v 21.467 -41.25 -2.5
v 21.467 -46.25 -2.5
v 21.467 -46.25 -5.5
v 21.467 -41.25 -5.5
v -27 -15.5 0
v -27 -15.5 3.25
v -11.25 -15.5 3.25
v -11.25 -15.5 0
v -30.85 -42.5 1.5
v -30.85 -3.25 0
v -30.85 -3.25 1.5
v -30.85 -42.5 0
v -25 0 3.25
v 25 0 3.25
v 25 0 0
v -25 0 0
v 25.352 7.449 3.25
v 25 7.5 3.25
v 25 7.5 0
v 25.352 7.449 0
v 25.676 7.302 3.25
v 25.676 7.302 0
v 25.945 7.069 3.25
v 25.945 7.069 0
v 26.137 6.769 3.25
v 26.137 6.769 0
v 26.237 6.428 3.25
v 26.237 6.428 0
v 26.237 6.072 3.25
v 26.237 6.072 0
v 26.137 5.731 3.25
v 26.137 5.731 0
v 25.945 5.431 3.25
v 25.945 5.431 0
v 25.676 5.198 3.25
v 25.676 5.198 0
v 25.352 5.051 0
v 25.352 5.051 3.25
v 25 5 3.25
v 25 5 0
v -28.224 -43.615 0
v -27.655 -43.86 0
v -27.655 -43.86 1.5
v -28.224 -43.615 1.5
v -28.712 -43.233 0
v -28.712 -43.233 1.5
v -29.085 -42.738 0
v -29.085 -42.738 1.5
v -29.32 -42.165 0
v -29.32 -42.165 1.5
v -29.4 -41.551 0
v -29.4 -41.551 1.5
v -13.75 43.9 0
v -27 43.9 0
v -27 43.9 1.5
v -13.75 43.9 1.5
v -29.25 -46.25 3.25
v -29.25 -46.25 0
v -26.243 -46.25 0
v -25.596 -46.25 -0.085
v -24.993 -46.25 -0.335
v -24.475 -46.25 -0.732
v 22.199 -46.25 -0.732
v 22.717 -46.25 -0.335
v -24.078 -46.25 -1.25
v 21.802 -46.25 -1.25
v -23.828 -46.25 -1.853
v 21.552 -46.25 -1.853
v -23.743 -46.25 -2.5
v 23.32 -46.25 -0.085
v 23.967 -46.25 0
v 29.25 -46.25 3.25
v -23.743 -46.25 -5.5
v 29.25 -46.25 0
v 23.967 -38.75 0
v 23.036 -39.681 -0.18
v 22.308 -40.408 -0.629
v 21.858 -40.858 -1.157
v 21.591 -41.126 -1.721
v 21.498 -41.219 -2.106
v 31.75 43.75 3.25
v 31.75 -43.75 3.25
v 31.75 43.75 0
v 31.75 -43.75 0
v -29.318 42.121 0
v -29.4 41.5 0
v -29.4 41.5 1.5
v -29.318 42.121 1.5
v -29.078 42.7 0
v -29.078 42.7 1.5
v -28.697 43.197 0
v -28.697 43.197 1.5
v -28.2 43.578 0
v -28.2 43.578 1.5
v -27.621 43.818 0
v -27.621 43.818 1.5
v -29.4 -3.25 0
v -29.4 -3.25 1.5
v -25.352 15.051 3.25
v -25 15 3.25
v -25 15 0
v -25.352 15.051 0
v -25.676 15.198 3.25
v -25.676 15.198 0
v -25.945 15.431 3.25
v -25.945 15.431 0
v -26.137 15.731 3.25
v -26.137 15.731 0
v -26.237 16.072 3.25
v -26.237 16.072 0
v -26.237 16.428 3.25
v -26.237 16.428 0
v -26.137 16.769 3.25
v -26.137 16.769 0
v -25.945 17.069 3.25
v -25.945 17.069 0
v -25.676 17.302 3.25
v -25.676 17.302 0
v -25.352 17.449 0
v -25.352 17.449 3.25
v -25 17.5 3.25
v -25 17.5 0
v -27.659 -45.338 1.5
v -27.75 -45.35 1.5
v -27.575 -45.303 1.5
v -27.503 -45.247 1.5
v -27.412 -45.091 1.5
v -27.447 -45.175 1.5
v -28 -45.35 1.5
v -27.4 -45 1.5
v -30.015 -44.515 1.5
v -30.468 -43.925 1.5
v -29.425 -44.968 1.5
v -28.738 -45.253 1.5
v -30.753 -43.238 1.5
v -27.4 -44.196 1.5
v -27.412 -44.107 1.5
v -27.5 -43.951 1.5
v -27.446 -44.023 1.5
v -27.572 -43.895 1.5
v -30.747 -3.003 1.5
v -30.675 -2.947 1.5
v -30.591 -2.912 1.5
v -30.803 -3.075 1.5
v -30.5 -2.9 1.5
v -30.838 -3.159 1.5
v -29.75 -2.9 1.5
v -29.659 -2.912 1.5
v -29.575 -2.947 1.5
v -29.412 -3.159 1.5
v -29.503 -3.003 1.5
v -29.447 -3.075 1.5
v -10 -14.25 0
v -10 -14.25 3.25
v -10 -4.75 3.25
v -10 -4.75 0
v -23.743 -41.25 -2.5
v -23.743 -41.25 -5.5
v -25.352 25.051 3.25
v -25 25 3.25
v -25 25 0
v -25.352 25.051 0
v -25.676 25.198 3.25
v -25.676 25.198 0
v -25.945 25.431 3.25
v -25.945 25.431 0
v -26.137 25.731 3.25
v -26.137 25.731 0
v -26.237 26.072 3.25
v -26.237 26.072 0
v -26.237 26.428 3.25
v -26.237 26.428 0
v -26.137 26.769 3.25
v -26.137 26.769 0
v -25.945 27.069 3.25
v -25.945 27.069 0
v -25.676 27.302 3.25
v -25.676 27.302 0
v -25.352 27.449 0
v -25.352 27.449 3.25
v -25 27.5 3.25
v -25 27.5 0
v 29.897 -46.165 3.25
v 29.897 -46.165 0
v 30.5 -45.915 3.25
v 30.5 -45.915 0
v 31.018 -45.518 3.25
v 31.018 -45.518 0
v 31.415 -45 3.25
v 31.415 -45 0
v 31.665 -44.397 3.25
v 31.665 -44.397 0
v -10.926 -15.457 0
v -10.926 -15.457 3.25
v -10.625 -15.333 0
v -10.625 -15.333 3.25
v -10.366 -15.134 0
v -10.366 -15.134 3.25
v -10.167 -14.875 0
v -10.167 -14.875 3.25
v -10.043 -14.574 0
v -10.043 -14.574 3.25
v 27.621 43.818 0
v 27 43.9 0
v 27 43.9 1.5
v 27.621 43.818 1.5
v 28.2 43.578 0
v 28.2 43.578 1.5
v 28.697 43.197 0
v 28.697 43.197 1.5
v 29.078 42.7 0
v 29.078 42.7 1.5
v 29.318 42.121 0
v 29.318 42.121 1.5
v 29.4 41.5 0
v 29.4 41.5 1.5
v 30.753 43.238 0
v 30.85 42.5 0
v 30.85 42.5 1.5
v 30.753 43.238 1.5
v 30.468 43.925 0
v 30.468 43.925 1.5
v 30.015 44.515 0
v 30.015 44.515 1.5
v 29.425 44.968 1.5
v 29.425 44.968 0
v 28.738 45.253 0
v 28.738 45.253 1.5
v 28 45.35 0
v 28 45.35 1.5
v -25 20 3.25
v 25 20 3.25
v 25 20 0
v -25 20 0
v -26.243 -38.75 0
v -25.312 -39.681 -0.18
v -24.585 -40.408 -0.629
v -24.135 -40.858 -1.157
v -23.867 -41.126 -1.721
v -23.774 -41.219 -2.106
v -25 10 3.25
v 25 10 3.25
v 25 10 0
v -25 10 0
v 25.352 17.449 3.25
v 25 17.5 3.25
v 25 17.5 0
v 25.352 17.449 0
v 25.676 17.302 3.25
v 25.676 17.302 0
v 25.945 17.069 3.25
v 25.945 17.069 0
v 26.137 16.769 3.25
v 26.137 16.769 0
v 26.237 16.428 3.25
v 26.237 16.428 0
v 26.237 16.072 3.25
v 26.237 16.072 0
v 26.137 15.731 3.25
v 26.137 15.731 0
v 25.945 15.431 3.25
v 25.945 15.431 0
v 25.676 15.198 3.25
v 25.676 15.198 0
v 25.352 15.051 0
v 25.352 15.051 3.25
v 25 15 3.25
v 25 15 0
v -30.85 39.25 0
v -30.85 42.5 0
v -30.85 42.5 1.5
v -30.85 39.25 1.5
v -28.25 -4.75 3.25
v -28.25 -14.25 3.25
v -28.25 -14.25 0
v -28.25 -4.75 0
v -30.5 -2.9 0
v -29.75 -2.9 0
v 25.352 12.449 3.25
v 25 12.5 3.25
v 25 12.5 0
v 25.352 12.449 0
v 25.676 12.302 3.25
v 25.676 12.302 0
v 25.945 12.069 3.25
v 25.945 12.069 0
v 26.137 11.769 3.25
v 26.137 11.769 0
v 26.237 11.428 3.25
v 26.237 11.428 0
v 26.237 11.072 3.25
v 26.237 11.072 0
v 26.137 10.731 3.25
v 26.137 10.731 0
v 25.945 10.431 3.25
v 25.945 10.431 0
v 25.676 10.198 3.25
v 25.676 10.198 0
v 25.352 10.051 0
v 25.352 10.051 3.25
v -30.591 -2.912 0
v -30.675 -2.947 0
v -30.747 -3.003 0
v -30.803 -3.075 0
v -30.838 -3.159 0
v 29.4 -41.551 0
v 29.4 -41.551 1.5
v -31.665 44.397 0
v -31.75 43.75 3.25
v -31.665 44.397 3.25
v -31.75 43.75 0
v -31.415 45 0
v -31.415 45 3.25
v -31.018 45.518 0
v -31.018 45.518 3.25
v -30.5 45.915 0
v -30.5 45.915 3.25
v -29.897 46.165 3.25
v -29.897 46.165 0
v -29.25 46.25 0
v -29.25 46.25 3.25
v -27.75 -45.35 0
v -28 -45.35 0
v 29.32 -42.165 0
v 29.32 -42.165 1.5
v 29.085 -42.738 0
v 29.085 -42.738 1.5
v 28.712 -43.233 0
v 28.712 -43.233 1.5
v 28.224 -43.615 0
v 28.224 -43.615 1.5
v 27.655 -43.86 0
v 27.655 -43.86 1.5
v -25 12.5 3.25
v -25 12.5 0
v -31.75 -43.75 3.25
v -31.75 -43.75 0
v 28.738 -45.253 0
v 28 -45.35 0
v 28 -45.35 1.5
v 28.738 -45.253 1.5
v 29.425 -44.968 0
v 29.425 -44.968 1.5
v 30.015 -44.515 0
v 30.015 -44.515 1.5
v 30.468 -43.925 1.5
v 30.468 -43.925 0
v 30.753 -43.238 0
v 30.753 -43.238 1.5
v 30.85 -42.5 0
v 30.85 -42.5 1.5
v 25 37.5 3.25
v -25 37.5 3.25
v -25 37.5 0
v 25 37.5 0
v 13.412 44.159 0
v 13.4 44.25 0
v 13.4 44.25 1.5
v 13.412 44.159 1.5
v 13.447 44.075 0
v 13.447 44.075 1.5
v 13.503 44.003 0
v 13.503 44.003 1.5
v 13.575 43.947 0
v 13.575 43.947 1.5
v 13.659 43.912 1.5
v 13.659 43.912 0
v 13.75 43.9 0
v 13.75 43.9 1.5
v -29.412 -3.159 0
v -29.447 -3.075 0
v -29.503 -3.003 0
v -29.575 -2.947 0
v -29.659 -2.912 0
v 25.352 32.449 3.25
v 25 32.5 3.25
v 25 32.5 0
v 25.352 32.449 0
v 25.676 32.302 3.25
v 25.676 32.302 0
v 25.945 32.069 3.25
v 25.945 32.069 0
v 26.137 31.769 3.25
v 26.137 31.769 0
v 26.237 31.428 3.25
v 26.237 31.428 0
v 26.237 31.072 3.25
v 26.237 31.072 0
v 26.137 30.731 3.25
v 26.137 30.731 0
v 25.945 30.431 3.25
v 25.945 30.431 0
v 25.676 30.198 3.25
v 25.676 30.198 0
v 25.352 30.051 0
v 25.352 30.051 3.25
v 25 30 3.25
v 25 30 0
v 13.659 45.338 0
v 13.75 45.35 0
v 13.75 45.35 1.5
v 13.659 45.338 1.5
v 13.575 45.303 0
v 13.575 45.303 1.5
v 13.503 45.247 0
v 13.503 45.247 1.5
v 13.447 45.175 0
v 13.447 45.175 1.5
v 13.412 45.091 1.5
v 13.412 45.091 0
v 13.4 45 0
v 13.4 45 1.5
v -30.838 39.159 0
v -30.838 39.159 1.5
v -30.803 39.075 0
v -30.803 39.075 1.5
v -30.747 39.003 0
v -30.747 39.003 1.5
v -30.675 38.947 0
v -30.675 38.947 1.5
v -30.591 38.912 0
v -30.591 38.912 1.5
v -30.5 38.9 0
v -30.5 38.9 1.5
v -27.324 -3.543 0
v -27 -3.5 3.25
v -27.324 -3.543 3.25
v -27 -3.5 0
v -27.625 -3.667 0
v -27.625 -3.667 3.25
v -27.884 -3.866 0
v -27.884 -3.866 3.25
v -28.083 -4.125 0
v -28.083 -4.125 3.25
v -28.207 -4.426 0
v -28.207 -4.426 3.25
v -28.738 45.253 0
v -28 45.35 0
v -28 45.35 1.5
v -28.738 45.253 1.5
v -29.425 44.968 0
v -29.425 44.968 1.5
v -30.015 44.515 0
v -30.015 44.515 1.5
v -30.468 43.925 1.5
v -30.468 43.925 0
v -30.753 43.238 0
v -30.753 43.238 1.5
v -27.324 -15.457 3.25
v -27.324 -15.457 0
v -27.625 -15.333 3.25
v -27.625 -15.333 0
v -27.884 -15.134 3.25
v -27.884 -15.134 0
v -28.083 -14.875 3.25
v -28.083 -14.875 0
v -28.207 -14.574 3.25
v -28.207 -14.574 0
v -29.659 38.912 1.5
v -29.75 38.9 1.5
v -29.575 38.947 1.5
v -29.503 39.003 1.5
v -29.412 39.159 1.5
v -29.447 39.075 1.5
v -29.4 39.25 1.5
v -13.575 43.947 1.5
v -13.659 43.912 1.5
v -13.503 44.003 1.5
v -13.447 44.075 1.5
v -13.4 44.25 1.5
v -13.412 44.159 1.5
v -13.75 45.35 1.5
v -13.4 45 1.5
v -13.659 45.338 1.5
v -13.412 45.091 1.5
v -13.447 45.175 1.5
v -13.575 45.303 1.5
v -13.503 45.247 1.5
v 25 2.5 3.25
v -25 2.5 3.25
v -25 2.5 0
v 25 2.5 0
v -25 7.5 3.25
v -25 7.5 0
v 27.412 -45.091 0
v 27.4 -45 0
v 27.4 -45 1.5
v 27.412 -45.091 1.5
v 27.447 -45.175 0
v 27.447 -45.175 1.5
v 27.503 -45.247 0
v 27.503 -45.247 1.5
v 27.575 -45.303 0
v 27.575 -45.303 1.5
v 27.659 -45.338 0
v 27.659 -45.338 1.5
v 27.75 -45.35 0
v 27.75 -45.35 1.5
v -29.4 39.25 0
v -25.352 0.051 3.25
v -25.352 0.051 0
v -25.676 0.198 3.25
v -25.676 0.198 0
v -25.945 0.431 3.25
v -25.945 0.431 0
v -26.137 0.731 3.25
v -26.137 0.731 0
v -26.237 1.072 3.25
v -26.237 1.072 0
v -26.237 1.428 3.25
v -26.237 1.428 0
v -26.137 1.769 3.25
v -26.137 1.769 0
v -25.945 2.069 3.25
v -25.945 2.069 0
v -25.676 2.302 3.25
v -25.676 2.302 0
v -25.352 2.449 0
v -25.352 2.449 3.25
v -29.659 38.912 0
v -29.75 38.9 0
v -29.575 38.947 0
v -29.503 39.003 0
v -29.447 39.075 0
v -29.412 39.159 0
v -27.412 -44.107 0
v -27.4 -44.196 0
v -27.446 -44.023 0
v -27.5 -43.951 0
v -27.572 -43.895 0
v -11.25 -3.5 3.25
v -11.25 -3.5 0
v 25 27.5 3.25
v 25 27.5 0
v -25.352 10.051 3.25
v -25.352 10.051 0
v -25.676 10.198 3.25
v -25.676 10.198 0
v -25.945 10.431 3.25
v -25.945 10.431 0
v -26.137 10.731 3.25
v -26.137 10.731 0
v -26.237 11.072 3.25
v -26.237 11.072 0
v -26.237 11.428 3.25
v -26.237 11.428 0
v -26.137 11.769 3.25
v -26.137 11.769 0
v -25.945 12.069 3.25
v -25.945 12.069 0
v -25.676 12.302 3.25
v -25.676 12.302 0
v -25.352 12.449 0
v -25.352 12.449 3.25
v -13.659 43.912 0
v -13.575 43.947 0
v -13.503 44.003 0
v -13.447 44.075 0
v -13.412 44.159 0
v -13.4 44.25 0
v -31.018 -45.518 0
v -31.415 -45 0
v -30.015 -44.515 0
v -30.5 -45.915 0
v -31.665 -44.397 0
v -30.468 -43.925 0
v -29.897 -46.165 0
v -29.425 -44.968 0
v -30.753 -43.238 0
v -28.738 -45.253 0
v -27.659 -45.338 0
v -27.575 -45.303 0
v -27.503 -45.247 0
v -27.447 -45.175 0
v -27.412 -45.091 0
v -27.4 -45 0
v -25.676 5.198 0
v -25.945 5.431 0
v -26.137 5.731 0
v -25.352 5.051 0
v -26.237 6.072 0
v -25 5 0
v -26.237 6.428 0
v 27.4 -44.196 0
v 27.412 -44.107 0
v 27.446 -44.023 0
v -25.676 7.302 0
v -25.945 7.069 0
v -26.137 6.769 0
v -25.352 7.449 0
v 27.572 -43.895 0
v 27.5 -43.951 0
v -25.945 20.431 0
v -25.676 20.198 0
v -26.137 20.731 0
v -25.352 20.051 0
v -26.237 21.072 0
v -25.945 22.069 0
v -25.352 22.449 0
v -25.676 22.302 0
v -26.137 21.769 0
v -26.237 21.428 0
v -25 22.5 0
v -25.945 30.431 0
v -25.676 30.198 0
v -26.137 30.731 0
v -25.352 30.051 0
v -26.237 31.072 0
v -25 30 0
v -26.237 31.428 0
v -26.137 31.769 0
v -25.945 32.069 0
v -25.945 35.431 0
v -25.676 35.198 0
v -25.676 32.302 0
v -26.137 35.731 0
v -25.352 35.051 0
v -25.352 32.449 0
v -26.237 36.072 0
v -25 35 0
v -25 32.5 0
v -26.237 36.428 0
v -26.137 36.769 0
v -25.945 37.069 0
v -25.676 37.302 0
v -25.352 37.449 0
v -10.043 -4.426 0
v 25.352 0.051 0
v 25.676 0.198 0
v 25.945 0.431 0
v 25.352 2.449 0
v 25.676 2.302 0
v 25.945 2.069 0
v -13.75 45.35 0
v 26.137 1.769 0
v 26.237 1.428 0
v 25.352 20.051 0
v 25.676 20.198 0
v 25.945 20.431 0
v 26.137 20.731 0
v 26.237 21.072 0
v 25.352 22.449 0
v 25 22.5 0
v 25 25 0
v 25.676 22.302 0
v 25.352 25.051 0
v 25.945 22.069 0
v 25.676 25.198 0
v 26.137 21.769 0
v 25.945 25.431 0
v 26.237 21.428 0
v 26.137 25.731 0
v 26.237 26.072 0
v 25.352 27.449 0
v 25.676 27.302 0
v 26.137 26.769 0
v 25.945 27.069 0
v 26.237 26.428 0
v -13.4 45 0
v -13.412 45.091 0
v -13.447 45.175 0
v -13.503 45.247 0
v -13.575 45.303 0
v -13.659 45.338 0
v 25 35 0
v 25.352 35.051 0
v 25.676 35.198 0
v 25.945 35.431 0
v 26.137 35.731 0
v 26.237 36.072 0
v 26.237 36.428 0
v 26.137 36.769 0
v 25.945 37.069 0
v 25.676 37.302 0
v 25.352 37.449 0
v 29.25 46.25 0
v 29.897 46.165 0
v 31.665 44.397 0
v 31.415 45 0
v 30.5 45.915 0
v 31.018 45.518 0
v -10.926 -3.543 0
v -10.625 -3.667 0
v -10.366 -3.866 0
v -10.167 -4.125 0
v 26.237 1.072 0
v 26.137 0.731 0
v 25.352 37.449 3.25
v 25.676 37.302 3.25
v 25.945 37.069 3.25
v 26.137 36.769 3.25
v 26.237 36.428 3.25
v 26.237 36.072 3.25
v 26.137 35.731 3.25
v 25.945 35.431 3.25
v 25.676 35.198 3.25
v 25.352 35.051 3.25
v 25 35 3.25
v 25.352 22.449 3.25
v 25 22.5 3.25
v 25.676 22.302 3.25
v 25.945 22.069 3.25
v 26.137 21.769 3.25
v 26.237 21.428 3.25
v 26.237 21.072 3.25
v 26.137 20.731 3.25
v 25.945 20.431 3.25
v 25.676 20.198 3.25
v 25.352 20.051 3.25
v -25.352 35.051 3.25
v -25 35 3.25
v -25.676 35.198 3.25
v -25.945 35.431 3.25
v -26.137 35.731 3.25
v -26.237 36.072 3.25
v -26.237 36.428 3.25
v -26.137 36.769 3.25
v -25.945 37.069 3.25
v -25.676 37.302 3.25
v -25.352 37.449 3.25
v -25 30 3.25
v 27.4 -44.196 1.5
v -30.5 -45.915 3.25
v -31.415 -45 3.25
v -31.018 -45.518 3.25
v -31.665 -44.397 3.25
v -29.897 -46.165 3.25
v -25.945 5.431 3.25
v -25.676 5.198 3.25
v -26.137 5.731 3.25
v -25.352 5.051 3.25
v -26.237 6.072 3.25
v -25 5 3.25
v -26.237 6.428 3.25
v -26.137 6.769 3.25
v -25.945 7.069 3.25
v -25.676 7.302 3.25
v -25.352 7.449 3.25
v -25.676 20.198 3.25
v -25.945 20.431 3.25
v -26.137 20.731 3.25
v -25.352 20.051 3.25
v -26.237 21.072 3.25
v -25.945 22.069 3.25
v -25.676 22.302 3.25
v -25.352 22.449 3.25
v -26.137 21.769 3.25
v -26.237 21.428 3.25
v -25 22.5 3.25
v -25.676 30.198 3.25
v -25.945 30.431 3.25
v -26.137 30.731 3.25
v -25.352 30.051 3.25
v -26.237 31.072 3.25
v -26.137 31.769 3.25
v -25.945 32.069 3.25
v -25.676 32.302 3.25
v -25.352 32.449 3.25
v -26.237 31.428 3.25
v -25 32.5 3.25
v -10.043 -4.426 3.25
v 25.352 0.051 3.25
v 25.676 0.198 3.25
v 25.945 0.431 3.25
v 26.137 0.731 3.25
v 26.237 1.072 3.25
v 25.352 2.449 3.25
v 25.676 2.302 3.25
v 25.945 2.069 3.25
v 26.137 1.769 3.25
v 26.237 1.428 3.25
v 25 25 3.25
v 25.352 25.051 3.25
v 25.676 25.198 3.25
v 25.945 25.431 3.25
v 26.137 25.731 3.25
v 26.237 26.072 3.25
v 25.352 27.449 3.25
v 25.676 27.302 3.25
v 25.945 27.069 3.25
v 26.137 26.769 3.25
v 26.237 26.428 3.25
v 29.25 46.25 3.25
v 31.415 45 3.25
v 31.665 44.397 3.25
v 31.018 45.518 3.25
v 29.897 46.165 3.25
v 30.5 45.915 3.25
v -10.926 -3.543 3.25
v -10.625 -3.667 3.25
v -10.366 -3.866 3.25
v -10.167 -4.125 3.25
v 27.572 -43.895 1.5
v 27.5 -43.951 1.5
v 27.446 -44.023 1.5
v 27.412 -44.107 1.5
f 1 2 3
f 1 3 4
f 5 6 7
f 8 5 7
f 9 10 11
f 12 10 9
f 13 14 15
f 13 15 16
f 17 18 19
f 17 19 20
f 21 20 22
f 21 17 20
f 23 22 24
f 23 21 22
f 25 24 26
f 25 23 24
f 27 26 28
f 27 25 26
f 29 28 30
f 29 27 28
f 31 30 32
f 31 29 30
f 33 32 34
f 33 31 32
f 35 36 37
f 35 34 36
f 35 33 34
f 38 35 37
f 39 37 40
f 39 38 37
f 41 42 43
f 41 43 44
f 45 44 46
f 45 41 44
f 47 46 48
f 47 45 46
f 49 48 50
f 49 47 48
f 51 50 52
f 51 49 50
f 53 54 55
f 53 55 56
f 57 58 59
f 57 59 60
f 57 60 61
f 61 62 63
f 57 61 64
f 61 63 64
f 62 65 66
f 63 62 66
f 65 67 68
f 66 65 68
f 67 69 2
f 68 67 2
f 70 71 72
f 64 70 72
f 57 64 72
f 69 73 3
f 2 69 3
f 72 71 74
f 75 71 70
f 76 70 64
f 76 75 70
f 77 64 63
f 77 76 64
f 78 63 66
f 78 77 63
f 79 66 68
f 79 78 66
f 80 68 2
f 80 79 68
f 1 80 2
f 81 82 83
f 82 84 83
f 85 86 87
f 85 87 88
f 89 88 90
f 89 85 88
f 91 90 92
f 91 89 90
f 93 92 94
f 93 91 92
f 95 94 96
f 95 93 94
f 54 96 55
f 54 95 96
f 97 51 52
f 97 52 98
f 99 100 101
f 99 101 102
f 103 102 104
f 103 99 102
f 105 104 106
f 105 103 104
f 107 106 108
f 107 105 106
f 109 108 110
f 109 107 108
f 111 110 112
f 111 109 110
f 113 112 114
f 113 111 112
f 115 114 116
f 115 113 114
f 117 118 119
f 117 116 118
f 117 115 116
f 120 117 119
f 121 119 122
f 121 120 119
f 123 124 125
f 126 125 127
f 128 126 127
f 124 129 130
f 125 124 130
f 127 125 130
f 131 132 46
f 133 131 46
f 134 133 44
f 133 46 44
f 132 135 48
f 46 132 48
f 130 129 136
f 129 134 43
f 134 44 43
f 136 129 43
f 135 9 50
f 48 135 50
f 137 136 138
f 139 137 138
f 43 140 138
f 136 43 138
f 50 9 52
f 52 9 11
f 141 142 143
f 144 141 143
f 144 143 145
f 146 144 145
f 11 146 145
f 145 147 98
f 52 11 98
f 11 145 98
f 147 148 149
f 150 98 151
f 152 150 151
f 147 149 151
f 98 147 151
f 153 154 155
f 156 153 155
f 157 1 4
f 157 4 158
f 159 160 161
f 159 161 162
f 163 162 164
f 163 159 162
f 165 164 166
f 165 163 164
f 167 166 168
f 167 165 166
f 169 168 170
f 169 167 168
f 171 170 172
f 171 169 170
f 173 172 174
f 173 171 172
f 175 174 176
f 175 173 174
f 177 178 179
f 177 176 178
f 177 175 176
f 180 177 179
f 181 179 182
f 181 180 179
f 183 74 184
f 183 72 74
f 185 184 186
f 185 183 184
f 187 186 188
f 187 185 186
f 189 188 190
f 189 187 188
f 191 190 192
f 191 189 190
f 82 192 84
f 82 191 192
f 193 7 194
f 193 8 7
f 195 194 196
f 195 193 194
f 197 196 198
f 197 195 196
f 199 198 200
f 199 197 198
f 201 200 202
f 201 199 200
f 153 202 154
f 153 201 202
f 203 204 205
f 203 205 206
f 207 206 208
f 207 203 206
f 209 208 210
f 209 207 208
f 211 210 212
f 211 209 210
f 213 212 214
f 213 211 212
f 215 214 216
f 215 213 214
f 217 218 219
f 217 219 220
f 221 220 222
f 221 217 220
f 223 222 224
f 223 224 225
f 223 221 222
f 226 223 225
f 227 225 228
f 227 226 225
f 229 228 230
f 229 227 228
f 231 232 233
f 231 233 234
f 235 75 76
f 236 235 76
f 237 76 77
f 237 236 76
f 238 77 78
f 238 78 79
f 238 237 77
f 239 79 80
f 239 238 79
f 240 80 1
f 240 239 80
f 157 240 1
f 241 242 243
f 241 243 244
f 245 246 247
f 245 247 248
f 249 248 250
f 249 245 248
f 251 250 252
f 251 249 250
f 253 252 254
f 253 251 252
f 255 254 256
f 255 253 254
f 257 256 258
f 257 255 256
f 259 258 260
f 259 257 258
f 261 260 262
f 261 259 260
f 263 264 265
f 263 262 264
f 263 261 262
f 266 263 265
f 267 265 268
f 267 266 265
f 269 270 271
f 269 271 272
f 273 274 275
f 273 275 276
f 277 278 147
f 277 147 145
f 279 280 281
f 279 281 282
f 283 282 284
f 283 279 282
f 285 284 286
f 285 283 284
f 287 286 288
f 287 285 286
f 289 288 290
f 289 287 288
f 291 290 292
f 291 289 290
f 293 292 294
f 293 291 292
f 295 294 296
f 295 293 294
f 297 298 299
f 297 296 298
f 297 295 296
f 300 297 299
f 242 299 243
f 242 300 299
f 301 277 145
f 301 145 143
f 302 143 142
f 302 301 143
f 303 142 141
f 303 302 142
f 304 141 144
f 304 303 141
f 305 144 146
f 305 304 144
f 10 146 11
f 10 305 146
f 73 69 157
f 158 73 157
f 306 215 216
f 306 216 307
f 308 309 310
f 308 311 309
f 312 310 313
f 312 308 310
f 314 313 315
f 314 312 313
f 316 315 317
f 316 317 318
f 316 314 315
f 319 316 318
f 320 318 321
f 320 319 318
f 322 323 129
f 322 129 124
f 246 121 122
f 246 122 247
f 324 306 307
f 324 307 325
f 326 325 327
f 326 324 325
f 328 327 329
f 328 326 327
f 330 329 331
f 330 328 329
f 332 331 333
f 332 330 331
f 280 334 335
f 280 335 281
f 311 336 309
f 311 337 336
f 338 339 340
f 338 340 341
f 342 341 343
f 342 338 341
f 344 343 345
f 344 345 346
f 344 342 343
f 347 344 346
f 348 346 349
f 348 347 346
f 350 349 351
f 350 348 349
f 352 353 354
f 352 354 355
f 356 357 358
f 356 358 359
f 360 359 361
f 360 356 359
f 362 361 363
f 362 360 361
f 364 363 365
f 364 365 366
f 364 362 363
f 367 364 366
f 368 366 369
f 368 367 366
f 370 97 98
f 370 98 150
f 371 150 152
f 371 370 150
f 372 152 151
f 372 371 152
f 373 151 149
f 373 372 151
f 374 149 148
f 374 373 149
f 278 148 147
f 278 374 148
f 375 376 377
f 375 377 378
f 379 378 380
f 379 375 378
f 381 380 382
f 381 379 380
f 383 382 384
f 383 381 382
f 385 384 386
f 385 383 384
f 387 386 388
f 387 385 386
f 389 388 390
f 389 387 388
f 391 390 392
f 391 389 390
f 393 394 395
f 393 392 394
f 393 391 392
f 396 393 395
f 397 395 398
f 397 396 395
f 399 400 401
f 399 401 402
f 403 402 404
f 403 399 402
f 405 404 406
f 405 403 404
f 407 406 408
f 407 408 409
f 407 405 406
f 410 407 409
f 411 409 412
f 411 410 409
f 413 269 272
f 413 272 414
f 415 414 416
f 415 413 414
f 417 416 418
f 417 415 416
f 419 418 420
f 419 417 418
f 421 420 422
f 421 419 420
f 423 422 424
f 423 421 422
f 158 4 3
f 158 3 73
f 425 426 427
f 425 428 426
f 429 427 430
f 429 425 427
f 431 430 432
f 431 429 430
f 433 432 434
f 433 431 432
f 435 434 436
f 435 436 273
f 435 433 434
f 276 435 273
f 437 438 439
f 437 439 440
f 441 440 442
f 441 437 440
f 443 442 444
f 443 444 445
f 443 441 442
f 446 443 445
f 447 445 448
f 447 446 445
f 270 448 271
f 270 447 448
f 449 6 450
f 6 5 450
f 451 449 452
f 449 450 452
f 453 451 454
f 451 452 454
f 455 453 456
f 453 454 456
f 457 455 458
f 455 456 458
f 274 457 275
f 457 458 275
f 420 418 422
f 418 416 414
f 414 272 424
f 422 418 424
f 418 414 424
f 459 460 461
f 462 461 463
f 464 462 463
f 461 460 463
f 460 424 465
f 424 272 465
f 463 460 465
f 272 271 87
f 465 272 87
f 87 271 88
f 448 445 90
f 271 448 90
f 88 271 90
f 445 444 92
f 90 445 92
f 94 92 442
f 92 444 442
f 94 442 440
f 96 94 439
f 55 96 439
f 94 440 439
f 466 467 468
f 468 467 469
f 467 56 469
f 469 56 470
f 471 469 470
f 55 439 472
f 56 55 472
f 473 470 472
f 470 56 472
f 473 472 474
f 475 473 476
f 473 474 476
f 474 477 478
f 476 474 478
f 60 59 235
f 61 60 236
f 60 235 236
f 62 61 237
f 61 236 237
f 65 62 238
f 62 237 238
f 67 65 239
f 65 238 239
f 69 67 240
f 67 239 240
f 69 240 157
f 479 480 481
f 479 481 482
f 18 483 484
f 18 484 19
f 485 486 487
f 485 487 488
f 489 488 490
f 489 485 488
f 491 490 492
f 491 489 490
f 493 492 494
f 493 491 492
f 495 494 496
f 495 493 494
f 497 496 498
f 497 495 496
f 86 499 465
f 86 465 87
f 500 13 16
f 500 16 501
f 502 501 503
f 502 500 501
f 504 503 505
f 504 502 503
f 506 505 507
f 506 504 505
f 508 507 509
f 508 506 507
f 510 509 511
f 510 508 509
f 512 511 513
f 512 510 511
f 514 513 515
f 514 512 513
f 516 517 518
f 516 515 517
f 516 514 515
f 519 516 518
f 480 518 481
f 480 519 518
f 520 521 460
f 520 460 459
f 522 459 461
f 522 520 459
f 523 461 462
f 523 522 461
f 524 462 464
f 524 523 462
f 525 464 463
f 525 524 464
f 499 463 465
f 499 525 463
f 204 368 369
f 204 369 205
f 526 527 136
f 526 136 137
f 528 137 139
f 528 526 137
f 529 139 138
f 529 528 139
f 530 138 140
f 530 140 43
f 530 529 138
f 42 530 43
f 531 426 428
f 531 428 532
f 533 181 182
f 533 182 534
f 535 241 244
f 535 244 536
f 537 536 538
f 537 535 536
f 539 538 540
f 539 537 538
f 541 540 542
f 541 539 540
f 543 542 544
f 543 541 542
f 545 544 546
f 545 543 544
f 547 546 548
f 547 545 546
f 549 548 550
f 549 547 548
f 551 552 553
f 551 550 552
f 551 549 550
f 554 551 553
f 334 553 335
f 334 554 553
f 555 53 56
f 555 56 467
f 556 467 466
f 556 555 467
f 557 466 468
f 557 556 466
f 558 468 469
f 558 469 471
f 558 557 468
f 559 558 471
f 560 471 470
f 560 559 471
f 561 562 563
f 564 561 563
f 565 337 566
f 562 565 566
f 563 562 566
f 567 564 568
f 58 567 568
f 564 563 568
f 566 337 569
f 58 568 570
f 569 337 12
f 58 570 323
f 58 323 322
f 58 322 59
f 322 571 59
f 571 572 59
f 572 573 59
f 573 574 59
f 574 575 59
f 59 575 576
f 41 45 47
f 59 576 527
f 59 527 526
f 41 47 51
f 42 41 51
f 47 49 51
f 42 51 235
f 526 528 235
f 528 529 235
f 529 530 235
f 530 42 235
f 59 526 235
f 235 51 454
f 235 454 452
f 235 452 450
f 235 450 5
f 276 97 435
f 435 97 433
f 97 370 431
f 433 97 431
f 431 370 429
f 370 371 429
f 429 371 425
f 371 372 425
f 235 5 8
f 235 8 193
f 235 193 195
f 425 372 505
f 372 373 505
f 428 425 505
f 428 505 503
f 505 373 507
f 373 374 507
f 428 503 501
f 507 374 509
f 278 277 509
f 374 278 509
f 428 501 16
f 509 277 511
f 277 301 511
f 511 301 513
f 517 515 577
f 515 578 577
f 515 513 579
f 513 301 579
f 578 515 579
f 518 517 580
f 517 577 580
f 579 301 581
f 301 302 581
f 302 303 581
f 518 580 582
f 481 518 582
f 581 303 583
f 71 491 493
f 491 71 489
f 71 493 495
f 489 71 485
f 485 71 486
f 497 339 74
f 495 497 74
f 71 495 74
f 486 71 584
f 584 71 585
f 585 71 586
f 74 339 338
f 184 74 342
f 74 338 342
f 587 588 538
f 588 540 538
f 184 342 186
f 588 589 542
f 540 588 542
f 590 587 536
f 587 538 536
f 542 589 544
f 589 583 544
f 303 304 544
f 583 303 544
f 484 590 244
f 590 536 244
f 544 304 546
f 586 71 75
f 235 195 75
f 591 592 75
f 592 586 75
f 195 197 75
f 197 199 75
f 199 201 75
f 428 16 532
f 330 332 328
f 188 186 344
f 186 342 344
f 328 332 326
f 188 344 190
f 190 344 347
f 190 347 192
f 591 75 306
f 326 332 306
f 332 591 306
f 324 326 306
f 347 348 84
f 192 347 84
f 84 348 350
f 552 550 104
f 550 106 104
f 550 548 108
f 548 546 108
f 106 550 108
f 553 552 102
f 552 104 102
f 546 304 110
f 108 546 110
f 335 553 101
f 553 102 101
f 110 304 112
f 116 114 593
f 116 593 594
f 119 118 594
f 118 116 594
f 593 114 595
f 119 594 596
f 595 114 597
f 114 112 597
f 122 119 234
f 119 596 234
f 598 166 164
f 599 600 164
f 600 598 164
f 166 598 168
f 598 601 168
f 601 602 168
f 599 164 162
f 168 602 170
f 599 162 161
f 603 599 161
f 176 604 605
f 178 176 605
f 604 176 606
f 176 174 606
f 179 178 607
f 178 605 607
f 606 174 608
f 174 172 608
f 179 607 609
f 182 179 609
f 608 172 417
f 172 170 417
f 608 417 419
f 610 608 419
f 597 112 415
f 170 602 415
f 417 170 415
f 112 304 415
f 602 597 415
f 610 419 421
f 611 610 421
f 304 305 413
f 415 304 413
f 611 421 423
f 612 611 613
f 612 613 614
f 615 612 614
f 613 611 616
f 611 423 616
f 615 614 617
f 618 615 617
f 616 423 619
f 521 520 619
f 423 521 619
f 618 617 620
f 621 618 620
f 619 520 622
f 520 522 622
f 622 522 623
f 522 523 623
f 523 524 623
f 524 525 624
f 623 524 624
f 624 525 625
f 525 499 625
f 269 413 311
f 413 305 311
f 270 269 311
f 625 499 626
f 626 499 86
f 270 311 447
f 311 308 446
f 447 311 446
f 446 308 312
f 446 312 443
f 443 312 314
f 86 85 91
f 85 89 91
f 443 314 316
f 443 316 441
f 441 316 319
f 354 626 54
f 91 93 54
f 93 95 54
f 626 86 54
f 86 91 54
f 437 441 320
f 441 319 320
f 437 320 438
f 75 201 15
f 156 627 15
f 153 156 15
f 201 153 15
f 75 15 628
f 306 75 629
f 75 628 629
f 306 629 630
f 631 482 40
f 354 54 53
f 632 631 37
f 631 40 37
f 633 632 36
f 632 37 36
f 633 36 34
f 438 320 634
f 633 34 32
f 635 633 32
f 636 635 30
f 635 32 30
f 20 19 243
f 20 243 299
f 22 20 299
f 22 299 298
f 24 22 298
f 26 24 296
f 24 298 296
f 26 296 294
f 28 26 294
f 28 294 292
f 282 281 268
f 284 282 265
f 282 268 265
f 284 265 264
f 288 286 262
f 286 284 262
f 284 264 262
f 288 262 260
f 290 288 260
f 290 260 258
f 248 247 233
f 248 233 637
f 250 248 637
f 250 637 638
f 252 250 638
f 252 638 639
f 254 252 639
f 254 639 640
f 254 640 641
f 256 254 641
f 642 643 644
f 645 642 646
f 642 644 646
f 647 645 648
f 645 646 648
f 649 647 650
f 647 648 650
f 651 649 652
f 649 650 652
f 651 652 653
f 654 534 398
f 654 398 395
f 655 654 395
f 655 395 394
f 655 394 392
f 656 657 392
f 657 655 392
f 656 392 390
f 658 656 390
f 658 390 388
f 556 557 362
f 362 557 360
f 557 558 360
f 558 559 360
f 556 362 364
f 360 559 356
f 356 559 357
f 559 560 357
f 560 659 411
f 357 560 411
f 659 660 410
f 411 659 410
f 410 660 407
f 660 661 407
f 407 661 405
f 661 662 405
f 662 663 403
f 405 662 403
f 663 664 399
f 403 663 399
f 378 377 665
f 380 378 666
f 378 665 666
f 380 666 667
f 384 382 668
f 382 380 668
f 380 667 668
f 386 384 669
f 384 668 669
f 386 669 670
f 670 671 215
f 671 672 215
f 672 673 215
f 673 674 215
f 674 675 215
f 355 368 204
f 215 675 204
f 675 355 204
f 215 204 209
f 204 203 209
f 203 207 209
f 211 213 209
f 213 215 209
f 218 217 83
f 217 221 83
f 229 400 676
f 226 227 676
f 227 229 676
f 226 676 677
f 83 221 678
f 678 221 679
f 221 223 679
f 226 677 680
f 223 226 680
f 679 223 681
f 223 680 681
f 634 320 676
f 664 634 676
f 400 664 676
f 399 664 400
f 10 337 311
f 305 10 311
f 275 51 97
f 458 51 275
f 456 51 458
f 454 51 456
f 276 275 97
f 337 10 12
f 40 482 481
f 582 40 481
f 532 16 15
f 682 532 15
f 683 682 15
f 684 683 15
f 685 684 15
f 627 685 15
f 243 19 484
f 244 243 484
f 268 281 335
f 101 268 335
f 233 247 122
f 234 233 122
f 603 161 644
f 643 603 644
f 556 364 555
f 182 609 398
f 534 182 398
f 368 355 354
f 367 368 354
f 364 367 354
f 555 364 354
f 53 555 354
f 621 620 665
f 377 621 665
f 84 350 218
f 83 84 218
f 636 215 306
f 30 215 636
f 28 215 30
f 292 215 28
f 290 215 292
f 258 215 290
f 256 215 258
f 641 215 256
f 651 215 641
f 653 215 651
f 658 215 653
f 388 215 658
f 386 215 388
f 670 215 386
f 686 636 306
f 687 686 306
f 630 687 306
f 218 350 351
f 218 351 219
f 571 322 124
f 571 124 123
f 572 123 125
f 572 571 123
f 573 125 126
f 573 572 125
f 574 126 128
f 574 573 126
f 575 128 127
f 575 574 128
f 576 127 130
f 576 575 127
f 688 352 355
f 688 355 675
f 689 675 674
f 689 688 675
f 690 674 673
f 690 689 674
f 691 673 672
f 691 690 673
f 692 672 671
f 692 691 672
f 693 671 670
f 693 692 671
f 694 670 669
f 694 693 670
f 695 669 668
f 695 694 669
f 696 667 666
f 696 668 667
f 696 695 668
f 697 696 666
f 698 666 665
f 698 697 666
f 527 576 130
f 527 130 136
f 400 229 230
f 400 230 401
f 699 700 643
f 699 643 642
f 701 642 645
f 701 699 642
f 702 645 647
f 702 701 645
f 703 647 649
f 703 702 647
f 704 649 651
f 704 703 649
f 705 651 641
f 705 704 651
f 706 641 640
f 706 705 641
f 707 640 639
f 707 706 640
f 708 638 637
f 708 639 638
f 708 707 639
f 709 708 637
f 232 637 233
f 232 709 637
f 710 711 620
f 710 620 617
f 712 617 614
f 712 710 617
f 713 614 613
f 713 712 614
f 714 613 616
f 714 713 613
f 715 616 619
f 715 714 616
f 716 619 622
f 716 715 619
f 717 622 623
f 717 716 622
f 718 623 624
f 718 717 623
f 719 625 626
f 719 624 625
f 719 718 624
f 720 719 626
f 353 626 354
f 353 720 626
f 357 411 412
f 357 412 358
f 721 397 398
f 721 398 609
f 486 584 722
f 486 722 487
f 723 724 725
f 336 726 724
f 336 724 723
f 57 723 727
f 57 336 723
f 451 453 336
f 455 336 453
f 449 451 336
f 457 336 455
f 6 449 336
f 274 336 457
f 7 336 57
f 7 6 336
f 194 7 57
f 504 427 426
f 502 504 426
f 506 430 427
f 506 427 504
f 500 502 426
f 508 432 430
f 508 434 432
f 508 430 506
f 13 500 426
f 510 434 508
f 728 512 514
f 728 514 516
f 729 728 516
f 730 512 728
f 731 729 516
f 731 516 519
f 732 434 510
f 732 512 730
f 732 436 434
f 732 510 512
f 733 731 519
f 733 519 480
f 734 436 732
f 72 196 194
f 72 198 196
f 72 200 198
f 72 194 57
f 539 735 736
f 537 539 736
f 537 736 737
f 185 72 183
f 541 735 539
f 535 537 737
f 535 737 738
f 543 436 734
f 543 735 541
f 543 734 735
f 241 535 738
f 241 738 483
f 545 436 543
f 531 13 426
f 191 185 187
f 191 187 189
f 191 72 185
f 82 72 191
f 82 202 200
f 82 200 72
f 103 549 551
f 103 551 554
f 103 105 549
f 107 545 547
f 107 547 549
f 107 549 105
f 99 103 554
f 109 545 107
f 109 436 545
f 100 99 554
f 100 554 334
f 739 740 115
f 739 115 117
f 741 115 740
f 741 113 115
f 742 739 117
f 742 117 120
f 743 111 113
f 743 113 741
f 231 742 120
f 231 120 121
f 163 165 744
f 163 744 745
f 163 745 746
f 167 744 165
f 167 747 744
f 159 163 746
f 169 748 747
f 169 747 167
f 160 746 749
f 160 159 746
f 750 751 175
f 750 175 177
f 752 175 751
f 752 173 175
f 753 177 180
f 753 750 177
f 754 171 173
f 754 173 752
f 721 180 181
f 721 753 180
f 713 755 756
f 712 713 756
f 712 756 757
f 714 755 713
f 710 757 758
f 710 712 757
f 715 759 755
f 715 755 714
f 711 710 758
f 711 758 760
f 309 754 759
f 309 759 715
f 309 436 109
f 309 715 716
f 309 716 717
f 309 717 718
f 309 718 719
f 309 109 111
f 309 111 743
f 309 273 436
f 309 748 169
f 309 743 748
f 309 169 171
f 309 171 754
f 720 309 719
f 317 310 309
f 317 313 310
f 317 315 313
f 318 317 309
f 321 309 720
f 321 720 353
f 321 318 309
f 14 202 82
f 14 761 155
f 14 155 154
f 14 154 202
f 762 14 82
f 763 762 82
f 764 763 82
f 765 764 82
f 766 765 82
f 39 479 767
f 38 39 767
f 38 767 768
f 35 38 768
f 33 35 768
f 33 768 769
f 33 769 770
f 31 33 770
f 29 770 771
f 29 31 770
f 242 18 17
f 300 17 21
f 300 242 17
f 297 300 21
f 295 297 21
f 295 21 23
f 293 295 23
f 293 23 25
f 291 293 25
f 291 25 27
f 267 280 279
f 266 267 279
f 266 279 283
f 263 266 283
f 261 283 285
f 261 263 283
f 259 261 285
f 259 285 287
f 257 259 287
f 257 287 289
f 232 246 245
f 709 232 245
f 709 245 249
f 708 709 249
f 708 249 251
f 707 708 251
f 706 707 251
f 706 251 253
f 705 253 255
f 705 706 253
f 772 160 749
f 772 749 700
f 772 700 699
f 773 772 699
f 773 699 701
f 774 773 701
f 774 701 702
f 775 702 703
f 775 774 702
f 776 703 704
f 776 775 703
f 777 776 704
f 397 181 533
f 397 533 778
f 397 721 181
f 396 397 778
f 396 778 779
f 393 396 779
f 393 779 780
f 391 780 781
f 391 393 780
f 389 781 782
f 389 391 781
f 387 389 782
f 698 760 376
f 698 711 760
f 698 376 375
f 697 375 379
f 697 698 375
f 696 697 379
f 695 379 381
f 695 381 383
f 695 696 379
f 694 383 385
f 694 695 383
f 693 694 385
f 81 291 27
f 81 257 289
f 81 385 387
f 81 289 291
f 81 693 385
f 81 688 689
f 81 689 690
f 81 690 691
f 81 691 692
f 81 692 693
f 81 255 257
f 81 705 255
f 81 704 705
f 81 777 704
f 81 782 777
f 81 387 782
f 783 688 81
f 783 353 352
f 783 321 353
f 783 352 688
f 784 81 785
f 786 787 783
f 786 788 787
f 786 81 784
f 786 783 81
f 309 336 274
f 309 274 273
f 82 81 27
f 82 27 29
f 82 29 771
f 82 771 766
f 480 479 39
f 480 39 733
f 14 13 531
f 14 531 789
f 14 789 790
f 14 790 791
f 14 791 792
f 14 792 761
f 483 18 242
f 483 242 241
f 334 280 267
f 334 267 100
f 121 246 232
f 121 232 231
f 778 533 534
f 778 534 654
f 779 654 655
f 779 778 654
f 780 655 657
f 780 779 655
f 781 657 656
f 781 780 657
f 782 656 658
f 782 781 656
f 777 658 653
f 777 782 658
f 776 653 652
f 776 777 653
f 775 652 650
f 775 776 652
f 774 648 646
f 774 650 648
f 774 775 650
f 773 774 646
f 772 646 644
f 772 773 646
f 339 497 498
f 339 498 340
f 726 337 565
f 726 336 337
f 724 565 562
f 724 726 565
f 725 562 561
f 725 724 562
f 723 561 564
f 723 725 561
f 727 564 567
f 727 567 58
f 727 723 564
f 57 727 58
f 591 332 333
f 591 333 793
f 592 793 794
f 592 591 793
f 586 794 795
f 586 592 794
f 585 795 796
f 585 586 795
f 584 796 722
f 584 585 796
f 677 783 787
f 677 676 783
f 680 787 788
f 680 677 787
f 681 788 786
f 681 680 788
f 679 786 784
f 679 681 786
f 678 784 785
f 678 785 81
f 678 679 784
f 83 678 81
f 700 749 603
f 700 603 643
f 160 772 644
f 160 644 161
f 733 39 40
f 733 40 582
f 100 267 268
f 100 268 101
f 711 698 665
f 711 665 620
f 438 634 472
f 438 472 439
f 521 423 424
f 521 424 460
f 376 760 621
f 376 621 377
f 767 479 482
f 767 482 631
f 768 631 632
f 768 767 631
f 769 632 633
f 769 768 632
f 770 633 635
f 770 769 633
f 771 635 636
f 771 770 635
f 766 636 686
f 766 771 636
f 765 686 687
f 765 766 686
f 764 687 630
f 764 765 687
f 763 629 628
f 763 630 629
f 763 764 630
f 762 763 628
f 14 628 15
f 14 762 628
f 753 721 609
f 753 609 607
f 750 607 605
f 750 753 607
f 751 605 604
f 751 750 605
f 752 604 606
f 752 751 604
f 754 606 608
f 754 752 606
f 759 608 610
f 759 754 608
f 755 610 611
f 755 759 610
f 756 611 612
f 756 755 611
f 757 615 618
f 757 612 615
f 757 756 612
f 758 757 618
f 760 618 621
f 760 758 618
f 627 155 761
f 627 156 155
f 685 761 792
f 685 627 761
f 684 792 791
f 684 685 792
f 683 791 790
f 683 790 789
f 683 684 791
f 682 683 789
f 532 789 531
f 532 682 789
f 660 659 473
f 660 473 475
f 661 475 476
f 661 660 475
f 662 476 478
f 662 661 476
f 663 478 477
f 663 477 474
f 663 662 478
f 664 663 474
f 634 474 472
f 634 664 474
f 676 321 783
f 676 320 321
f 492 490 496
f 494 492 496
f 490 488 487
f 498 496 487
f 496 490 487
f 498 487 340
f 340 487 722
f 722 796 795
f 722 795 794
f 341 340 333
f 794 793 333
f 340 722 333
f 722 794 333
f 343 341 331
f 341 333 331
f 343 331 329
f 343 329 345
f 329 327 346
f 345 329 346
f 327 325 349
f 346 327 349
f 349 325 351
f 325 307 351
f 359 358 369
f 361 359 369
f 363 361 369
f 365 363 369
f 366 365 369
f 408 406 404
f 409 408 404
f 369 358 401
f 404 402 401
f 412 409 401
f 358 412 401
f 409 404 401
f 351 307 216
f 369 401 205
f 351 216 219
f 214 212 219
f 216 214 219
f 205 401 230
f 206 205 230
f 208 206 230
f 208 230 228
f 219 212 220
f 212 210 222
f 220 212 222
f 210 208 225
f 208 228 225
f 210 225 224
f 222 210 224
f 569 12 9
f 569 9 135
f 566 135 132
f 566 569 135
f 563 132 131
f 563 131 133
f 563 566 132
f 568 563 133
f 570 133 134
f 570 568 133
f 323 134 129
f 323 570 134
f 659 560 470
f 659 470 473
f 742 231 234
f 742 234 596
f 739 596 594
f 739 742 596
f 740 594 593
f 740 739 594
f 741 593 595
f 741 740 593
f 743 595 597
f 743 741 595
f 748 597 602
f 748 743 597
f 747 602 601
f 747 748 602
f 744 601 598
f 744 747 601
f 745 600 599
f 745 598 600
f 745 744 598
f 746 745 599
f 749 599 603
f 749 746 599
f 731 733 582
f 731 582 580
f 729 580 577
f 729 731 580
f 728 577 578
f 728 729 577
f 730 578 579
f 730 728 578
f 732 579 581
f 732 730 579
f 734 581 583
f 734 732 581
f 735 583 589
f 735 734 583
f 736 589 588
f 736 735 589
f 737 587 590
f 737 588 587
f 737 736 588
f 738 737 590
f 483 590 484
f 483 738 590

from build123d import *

# Parameters (mm, degrees)
SKETCH1_W           = 63.5
SKETCH1_H           = 92.5
BOSS_EXTRUDE1_DEPTH = 1.5
BOSS_EXTRUDE2_START = 1.5
SKETCH1_2_W         = 63.5
SKETCH1_2_H         = 92.5
BOSS_EXTRUDE2_DEPTH = 1.75
SKETCH3_W           = 18.25
SKETCH3_H           = 12
CUT_EXTRUDE1_DEPTH  = 57.193304761
FILLET1_R           = 2.5
FILLET2_R           = 1.25
CUT_EXTRUDE2_DEPTH  = 57.193304761
SKETCH5_W           = 45.209659229
SKETCH5_H           = 5
BOSS_EXTRUDE3_DEPTH = 5.5
FILLET3_R           = 2.5


with BuildPart() as part:
    # Sketch1 → Boss-Extrude1 (new body)
    with BuildSketch(Plane.XY):
        Rectangle(SKETCH1_W, SKETCH1_H)
        with BuildLine():
            Line((-27, 43.9), (-13.75, 43.9))
            ThreePointArc((-13.75, 43.9), (-13.502512627, 44.002512627), (-13.4, 44.25))
            Line((-13.4, 44.25), (-13.4, 45))
            ThreePointArc((-13.4, 45), (-13.502512627, 45.247487373), (-13.75, 45.35))
            Line((-13.75, 45.35), (-28, 45.35))
            ThreePointArc((-28, 45.35), (-30.015254326, 44.515254326), (-30.85, 42.5))
            Line((-30.85, 42.5), (-30.85, 39.25))
            ThreePointArc((-30.85, 39.25), (-30.747487373, 39.002512627), (-30.5, 38.9))
            Line((-30.5, 38.9), (-29.75, 38.9))
            ThreePointArc((-29.75, 38.9), (-29.502512627, 39.002512627), (-29.4, 39.25))
            Line((-29.4, 39.25), (-29.4, 41.5))
            ThreePointArc((-29.4, 41.5), (-28.697056275, 43.197056275), (-27, 43.9))
        make_face(mode=Mode.SUBTRACT)
        with BuildLine():
            Line((30.85, -42.5), (30.85, 42.5))
            ThreePointArc((30.85, 42.5), (30.015254326, 44.515254326), (28, 45.35))
            Line((28, 45.35), (13.75, 45.35))
            ThreePointArc((13.75, 45.35), (13.502512627, 45.247487373), (13.4, 45))
            Line((13.4, 45), (13.4, 44.25))
            ThreePointArc((13.4, 44.25), (13.502512627, 44.002512627), (13.75, 43.9))
            Line((13.75, 43.9), (27, 43.9))
            ThreePointArc((27, 43.9), (28.697056275, 43.197056275), (29.4, 41.5))
            Line((29.4, 41.5), (29.4, -41.550510257))
            ThreePointArc((29.4, -41.550510257), (28.914537685, -42.997764711), (27.654545455, -43.859529583))
            ThreePointArc((27.654545455, -43.859529583), (27.470796588, -43.985203627), (27.4, -44.196261568))
            Line((27.4, -44.196261568), (27.4, -45))
            ThreePointArc((27.4, -45), (27.502512627, -45.247487373), (27.75, -45.35))
            Line((27.75, -45.35), (28, -45.35))
            ThreePointArc((28, -45.35), (30.015254326, -44.515254326), (30.85, -42.5))
        make_face(mode=Mode.SUBTRACT)
        with BuildLine():
            Line((-29.4, -41.550510257), (-29.4, -3.25))
            ThreePointArc((-29.4, -3.25), (-29.502512627, -3.002512627), (-29.75, -2.9))
            Line((-29.75, -2.9), (-30.5, -2.9))
            ThreePointArc((-30.5, -2.9), (-30.747487373, -3.002512627), (-30.85, -3.25))
            Line((-30.85, -3.25), (-30.85, -42.5))
            ThreePointArc((-30.85, -42.5), (-30.015254326, -44.515254326), (-28, -45.35))
            Line((-28, -45.35), (-27.75, -45.35))
            ThreePointArc((-27.75, -45.35), (-27.502512627, -45.247487373), (-27.4, -45))
            Line((-27.4, -45), (-27.4, -44.196261568))
            ThreePointArc((-27.4, -44.196261568), (-27.470796588, -43.985203627), (-27.654545455, -43.859529583))
            ThreePointArc((-27.654545455, -43.859529583), (-28.914537685, -42.997764711), (-29.4, -41.550510257))
        make_face(mode=Mode.SUBTRACT)
    extrude(amount=BOSS_EXTRUDE1_DEPTH)

    # Sketch1<2> → Boss-Extrude2 (add)
    with BuildSketch(Plane.XY.offset(BOSS_EXTRUDE2_START)):
        Rectangle(SKETCH1_2_W, SKETCH1_2_H)
    extrude(amount=BOSS_EXTRUDE2_DEPTH)

    # Sketch3 → Cut-Extrude1 (cut, through all)
    with BuildSketch(Plane.XY.offset(3.25)):
        with Locations((-19.125, -9.5)):
            Rectangle(SKETCH3_W, SKETCH3_H)
    extrude(amount=-CUT_EXTRUDE1_DEPTH, mode=Mode.SUBTRACT)

    # Fillet1
    fillet1_edges = [part.edges().sort_by_distance(p)[0] for p in [
        (-31.75, 46.25, 1.625),
        (31.75, 46.25, 1.625),
        (31.75, -46.25, 1.625),
        (-31.75, -46.25, 1.625),
    ]]
    fillet(fillet1_edges, radius=FILLET1_R)

    # Fillet2
    fillet2_edges = [part.edges().sort_by_distance(p)[0] for p in [
        (-28.25, -15.5, 1.625),
        (-28.25, -3.5, 1.625),
        (-10, -3.5, 1.625),
        (-10, -15.5, 1.625),
    ]]
    fillet(fillet2_edges, radius=FILLET2_R)

    # Sketch4 → Cut-Extrude2 (cut, through all)
    with BuildSketch(Plane.XY.offset(3.25)):
        with BuildLine():
            Line((-25, 37.5), (25, 37.5))
            ThreePointArc((25, 37.5), (26.25, 36.25), (25, 35))
            Line((25, 35), (-25, 35))
            ThreePointArc((-25, 35), (-26.25, 36.25), (-25, 37.5))
        make_face()
        with BuildLine():
            Line((-25, 32.5), (25, 32.5))
            ThreePointArc((25, 32.5), (26.25, 31.25), (25, 30))
            Line((25, 30), (-25, 30))
            ThreePointArc((-25, 30), (-26.25, 31.25), (-25, 32.5))
        make_face()
        with BuildLine():
            Line((-25, 27.5), (25, 27.5))
            ThreePointArc((25, 27.5), (26.25, 26.25), (25, 25))
            Line((25, 25), (-25, 25))
            ThreePointArc((-25, 25), (-26.25, 26.25), (-25, 27.5))
        make_face()
        with BuildLine():
            Line((-25, 22.5), (25, 22.5))
            ThreePointArc((25, 22.5), (26.25, 21.25), (25, 20))
            Line((25, 20), (-25, 20))
            ThreePointArc((-25, 20), (-26.25, 21.25), (-25, 22.5))
        make_face()
        with BuildLine():
            Line((-25, 17.5), (25, 17.5))
            ThreePointArc((25, 17.5), (26.25, 16.25), (25, 15))
            Line((25, 15), (-25, 15))
            ThreePointArc((-25, 15), (-26.25, 16.25), (-25, 17.5))
        make_face()
        with BuildLine():
            Line((-25, 12.5), (25, 12.5))
            ThreePointArc((25, 12.5), (26.25, 11.25), (25, 10))
            Line((25, 10), (-25, 10))
            ThreePointArc((-25, 10), (-26.25, 11.25), (-25, 12.5))
        make_face()
        with BuildLine():
            Line((-25, 7.5), (25, 7.5))
            ThreePointArc((25, 7.5), (26.25, 6.25), (25, 5))
            Line((25, 5), (-25, 5))
            ThreePointArc((-25, 5), (-26.25, 6.25), (-25, 7.5))
        make_face()
        with BuildLine():
            Line((-25, 2.5), (25, 2.5))
            ThreePointArc((25, 2.5), (26.25, 1.25), (25, 0))
            Line((25, 0), (-25, 0))
            ThreePointArc((-25, 0), (-26.25, 1.25), (-25, 2.5))
        make_face()
    extrude(amount=-CUT_EXTRUDE2_DEPTH, mode=Mode.SUBTRACT)

    # Sketch5 → Boss-Extrude3 (add)
    with BuildSketch(Plane(origin=(0, 0, 0), x_dir=(-1, 0, 0), z_dir=(0, 0, -1))):
        with Locations((1.138073126, -43.75)):
            Rectangle(SKETCH5_W, SKETCH5_H)
    extrude(amount=BOSS_EXTRUDE3_DEPTH)

    # Fillet3
    fillet3_edges = [part.edges().sort_by_distance(p)[0] for p in [
        (-23.74290274, -43.75, 0),
        (-1.138073126, -41.25, 0),
        (21.466756489, -43.75, 0),
    ]]
    fillet(fillet3_edges, radius=FILLET3_R)


solid = part.part
